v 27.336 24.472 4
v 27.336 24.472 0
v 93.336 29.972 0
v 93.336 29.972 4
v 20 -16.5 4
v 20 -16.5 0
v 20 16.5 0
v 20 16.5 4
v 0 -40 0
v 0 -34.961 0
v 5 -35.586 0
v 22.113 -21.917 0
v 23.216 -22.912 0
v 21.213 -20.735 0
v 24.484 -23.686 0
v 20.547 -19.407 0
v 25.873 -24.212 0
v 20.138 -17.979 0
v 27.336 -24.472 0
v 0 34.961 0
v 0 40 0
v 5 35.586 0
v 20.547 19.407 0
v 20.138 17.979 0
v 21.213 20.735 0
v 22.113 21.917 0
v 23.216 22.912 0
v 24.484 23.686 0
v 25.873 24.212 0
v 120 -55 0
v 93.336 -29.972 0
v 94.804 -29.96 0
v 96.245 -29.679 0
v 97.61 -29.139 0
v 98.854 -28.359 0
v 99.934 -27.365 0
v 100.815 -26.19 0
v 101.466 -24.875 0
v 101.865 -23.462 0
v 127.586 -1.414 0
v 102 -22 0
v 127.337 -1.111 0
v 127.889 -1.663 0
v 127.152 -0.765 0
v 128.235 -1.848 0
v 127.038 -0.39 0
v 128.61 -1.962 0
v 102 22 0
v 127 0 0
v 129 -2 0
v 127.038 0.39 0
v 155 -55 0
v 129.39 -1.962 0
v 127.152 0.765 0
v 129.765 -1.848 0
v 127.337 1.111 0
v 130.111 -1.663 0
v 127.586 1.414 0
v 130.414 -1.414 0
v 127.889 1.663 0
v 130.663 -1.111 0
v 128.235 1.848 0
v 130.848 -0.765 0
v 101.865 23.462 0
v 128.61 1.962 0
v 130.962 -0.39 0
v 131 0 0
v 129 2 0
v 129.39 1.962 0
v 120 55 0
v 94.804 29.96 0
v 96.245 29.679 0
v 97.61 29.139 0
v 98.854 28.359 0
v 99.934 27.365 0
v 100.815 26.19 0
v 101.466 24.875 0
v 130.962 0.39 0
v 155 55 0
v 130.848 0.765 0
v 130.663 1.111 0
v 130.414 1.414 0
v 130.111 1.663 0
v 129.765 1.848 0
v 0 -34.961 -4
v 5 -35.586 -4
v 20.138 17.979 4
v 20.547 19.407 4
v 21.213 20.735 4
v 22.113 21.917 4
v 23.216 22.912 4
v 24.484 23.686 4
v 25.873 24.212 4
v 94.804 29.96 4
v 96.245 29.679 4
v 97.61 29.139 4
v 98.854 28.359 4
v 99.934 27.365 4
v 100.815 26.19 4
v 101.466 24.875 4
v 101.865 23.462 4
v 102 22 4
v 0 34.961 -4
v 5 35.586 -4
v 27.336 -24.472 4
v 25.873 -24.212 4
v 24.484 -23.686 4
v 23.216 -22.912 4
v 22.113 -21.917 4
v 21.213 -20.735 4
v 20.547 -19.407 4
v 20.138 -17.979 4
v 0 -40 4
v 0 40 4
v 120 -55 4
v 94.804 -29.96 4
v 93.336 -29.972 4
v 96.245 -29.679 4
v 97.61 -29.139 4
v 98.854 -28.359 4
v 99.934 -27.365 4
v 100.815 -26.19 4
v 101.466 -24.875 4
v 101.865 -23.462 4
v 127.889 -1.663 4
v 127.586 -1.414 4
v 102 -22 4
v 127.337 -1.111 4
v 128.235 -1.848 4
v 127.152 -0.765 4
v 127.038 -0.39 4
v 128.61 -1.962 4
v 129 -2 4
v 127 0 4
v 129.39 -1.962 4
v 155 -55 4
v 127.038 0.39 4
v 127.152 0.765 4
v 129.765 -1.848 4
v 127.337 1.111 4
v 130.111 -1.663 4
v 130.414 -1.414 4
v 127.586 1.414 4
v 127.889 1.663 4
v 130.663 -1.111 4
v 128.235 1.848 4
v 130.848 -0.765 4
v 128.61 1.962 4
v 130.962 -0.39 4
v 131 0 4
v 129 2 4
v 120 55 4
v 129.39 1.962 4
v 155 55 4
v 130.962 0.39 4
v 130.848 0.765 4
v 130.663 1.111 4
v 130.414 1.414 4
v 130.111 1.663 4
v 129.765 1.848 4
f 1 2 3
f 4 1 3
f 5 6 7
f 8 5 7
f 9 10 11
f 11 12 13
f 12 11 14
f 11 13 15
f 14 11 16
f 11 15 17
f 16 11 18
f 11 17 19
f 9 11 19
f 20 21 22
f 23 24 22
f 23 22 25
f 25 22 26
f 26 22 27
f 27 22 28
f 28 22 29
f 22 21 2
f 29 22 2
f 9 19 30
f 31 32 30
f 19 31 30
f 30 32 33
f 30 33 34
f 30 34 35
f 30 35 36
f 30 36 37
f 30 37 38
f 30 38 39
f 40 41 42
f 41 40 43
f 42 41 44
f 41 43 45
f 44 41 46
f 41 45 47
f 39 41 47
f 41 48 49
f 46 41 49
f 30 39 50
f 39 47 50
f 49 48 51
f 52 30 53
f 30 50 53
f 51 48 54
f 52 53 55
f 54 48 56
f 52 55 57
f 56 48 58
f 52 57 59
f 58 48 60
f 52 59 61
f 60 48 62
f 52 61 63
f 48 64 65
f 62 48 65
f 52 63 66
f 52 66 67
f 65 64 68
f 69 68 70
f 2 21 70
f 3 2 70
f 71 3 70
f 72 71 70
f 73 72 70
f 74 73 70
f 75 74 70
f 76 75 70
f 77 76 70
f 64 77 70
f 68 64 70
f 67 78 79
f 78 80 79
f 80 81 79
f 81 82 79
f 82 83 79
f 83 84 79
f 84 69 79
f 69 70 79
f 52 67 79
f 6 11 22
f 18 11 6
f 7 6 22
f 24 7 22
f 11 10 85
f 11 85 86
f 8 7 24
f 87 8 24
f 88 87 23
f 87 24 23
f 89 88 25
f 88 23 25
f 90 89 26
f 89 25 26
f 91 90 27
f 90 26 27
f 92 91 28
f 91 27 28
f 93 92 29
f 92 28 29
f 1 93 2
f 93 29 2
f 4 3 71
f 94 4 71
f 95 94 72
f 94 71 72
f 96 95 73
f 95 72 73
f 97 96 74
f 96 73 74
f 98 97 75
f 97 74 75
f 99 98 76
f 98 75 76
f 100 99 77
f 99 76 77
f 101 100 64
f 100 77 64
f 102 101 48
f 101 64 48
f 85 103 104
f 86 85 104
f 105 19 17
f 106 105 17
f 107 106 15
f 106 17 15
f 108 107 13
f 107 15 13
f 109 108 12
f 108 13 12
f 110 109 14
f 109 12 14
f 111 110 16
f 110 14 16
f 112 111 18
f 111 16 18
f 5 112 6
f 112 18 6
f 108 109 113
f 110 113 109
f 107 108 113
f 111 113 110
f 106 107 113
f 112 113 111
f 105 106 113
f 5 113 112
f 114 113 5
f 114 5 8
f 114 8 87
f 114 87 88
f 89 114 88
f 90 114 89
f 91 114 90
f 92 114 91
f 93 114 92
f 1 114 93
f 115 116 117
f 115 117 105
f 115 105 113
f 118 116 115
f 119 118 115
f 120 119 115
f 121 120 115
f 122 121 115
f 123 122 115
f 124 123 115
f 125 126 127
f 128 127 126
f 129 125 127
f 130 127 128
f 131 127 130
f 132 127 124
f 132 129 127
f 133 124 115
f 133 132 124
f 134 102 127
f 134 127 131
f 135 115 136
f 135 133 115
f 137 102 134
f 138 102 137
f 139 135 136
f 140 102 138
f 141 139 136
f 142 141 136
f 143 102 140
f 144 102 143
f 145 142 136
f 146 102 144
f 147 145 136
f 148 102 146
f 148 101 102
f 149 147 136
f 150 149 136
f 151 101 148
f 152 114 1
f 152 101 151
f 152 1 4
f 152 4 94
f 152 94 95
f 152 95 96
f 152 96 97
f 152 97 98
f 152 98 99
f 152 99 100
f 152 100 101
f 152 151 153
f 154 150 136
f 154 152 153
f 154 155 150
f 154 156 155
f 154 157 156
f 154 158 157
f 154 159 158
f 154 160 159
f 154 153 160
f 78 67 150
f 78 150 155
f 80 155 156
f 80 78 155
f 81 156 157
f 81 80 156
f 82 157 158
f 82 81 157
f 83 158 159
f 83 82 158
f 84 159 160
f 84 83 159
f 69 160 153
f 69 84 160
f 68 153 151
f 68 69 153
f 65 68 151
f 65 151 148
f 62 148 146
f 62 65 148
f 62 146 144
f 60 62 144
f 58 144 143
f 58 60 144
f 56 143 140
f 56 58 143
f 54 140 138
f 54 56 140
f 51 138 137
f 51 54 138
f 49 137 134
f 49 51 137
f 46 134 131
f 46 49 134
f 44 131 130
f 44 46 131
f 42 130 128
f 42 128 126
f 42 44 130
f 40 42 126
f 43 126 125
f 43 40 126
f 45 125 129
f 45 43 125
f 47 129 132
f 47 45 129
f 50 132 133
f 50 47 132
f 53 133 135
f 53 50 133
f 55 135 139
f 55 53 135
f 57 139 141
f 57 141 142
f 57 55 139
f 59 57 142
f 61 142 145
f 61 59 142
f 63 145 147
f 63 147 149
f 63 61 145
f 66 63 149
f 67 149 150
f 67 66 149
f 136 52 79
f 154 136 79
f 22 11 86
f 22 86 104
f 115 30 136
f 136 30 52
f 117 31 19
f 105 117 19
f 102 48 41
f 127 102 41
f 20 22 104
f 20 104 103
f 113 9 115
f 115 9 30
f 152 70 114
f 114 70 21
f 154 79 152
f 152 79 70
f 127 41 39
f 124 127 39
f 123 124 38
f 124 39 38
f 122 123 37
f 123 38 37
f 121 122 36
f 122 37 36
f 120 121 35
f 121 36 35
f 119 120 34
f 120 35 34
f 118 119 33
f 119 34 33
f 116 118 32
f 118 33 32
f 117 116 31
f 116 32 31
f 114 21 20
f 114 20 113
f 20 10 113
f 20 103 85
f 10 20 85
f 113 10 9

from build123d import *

# Parameters (mm, degrees)
F0_R     = 2
F1_DEPTH = 4
F3_DEPTH = 4


with BuildPart() as f1:
    # F0 (on Top) → F1 (new body)
    with BuildSketch(Plane.XY):
        Polygon((120, 55), (0, 40), (0, -40), (120, -55), (155, -55), (155, 55), align=None)
        with BuildLine():
            Line((20, -16.5), (20, 16.5))
            ThreePointArc((20, 16.5), (22.112942, 21.916876), (27.335636, 24.472366))
            Line((27.335636, 24.472366), (93.335636, 29.972366))
            ThreePointArc((93.335636, 29.972366), (99.416876, 27.887058), (102, 22))
            Line((102, 22), (102, -22))
            ThreePointArc((102, -22), (99.416876, -27.887058), (93.335636, -29.972366))
            Line((93.335636, -29.972366), (27.335636, -24.472366))
            ThreePointArc((27.335636, -24.472366), (22.112942, -21.916876), (20, -16.5))
        make_face(mode=Mode.SUBTRACT)
        with Locations((129, 0)):
            Circle(F0_R, mode=Mode.SUBTRACT)
    extrude(amount=F1_DEPTH)

    # F2 (on face) → F3 (join)
    with BuildSketch(Plane.XY):
        Polygon((0, 34.961089), (0, -34.961089), (5, -35.586089), (5, 35.586089), align=None)
    extrude(amount=-F3_DEPTH)


solid = f1.part
